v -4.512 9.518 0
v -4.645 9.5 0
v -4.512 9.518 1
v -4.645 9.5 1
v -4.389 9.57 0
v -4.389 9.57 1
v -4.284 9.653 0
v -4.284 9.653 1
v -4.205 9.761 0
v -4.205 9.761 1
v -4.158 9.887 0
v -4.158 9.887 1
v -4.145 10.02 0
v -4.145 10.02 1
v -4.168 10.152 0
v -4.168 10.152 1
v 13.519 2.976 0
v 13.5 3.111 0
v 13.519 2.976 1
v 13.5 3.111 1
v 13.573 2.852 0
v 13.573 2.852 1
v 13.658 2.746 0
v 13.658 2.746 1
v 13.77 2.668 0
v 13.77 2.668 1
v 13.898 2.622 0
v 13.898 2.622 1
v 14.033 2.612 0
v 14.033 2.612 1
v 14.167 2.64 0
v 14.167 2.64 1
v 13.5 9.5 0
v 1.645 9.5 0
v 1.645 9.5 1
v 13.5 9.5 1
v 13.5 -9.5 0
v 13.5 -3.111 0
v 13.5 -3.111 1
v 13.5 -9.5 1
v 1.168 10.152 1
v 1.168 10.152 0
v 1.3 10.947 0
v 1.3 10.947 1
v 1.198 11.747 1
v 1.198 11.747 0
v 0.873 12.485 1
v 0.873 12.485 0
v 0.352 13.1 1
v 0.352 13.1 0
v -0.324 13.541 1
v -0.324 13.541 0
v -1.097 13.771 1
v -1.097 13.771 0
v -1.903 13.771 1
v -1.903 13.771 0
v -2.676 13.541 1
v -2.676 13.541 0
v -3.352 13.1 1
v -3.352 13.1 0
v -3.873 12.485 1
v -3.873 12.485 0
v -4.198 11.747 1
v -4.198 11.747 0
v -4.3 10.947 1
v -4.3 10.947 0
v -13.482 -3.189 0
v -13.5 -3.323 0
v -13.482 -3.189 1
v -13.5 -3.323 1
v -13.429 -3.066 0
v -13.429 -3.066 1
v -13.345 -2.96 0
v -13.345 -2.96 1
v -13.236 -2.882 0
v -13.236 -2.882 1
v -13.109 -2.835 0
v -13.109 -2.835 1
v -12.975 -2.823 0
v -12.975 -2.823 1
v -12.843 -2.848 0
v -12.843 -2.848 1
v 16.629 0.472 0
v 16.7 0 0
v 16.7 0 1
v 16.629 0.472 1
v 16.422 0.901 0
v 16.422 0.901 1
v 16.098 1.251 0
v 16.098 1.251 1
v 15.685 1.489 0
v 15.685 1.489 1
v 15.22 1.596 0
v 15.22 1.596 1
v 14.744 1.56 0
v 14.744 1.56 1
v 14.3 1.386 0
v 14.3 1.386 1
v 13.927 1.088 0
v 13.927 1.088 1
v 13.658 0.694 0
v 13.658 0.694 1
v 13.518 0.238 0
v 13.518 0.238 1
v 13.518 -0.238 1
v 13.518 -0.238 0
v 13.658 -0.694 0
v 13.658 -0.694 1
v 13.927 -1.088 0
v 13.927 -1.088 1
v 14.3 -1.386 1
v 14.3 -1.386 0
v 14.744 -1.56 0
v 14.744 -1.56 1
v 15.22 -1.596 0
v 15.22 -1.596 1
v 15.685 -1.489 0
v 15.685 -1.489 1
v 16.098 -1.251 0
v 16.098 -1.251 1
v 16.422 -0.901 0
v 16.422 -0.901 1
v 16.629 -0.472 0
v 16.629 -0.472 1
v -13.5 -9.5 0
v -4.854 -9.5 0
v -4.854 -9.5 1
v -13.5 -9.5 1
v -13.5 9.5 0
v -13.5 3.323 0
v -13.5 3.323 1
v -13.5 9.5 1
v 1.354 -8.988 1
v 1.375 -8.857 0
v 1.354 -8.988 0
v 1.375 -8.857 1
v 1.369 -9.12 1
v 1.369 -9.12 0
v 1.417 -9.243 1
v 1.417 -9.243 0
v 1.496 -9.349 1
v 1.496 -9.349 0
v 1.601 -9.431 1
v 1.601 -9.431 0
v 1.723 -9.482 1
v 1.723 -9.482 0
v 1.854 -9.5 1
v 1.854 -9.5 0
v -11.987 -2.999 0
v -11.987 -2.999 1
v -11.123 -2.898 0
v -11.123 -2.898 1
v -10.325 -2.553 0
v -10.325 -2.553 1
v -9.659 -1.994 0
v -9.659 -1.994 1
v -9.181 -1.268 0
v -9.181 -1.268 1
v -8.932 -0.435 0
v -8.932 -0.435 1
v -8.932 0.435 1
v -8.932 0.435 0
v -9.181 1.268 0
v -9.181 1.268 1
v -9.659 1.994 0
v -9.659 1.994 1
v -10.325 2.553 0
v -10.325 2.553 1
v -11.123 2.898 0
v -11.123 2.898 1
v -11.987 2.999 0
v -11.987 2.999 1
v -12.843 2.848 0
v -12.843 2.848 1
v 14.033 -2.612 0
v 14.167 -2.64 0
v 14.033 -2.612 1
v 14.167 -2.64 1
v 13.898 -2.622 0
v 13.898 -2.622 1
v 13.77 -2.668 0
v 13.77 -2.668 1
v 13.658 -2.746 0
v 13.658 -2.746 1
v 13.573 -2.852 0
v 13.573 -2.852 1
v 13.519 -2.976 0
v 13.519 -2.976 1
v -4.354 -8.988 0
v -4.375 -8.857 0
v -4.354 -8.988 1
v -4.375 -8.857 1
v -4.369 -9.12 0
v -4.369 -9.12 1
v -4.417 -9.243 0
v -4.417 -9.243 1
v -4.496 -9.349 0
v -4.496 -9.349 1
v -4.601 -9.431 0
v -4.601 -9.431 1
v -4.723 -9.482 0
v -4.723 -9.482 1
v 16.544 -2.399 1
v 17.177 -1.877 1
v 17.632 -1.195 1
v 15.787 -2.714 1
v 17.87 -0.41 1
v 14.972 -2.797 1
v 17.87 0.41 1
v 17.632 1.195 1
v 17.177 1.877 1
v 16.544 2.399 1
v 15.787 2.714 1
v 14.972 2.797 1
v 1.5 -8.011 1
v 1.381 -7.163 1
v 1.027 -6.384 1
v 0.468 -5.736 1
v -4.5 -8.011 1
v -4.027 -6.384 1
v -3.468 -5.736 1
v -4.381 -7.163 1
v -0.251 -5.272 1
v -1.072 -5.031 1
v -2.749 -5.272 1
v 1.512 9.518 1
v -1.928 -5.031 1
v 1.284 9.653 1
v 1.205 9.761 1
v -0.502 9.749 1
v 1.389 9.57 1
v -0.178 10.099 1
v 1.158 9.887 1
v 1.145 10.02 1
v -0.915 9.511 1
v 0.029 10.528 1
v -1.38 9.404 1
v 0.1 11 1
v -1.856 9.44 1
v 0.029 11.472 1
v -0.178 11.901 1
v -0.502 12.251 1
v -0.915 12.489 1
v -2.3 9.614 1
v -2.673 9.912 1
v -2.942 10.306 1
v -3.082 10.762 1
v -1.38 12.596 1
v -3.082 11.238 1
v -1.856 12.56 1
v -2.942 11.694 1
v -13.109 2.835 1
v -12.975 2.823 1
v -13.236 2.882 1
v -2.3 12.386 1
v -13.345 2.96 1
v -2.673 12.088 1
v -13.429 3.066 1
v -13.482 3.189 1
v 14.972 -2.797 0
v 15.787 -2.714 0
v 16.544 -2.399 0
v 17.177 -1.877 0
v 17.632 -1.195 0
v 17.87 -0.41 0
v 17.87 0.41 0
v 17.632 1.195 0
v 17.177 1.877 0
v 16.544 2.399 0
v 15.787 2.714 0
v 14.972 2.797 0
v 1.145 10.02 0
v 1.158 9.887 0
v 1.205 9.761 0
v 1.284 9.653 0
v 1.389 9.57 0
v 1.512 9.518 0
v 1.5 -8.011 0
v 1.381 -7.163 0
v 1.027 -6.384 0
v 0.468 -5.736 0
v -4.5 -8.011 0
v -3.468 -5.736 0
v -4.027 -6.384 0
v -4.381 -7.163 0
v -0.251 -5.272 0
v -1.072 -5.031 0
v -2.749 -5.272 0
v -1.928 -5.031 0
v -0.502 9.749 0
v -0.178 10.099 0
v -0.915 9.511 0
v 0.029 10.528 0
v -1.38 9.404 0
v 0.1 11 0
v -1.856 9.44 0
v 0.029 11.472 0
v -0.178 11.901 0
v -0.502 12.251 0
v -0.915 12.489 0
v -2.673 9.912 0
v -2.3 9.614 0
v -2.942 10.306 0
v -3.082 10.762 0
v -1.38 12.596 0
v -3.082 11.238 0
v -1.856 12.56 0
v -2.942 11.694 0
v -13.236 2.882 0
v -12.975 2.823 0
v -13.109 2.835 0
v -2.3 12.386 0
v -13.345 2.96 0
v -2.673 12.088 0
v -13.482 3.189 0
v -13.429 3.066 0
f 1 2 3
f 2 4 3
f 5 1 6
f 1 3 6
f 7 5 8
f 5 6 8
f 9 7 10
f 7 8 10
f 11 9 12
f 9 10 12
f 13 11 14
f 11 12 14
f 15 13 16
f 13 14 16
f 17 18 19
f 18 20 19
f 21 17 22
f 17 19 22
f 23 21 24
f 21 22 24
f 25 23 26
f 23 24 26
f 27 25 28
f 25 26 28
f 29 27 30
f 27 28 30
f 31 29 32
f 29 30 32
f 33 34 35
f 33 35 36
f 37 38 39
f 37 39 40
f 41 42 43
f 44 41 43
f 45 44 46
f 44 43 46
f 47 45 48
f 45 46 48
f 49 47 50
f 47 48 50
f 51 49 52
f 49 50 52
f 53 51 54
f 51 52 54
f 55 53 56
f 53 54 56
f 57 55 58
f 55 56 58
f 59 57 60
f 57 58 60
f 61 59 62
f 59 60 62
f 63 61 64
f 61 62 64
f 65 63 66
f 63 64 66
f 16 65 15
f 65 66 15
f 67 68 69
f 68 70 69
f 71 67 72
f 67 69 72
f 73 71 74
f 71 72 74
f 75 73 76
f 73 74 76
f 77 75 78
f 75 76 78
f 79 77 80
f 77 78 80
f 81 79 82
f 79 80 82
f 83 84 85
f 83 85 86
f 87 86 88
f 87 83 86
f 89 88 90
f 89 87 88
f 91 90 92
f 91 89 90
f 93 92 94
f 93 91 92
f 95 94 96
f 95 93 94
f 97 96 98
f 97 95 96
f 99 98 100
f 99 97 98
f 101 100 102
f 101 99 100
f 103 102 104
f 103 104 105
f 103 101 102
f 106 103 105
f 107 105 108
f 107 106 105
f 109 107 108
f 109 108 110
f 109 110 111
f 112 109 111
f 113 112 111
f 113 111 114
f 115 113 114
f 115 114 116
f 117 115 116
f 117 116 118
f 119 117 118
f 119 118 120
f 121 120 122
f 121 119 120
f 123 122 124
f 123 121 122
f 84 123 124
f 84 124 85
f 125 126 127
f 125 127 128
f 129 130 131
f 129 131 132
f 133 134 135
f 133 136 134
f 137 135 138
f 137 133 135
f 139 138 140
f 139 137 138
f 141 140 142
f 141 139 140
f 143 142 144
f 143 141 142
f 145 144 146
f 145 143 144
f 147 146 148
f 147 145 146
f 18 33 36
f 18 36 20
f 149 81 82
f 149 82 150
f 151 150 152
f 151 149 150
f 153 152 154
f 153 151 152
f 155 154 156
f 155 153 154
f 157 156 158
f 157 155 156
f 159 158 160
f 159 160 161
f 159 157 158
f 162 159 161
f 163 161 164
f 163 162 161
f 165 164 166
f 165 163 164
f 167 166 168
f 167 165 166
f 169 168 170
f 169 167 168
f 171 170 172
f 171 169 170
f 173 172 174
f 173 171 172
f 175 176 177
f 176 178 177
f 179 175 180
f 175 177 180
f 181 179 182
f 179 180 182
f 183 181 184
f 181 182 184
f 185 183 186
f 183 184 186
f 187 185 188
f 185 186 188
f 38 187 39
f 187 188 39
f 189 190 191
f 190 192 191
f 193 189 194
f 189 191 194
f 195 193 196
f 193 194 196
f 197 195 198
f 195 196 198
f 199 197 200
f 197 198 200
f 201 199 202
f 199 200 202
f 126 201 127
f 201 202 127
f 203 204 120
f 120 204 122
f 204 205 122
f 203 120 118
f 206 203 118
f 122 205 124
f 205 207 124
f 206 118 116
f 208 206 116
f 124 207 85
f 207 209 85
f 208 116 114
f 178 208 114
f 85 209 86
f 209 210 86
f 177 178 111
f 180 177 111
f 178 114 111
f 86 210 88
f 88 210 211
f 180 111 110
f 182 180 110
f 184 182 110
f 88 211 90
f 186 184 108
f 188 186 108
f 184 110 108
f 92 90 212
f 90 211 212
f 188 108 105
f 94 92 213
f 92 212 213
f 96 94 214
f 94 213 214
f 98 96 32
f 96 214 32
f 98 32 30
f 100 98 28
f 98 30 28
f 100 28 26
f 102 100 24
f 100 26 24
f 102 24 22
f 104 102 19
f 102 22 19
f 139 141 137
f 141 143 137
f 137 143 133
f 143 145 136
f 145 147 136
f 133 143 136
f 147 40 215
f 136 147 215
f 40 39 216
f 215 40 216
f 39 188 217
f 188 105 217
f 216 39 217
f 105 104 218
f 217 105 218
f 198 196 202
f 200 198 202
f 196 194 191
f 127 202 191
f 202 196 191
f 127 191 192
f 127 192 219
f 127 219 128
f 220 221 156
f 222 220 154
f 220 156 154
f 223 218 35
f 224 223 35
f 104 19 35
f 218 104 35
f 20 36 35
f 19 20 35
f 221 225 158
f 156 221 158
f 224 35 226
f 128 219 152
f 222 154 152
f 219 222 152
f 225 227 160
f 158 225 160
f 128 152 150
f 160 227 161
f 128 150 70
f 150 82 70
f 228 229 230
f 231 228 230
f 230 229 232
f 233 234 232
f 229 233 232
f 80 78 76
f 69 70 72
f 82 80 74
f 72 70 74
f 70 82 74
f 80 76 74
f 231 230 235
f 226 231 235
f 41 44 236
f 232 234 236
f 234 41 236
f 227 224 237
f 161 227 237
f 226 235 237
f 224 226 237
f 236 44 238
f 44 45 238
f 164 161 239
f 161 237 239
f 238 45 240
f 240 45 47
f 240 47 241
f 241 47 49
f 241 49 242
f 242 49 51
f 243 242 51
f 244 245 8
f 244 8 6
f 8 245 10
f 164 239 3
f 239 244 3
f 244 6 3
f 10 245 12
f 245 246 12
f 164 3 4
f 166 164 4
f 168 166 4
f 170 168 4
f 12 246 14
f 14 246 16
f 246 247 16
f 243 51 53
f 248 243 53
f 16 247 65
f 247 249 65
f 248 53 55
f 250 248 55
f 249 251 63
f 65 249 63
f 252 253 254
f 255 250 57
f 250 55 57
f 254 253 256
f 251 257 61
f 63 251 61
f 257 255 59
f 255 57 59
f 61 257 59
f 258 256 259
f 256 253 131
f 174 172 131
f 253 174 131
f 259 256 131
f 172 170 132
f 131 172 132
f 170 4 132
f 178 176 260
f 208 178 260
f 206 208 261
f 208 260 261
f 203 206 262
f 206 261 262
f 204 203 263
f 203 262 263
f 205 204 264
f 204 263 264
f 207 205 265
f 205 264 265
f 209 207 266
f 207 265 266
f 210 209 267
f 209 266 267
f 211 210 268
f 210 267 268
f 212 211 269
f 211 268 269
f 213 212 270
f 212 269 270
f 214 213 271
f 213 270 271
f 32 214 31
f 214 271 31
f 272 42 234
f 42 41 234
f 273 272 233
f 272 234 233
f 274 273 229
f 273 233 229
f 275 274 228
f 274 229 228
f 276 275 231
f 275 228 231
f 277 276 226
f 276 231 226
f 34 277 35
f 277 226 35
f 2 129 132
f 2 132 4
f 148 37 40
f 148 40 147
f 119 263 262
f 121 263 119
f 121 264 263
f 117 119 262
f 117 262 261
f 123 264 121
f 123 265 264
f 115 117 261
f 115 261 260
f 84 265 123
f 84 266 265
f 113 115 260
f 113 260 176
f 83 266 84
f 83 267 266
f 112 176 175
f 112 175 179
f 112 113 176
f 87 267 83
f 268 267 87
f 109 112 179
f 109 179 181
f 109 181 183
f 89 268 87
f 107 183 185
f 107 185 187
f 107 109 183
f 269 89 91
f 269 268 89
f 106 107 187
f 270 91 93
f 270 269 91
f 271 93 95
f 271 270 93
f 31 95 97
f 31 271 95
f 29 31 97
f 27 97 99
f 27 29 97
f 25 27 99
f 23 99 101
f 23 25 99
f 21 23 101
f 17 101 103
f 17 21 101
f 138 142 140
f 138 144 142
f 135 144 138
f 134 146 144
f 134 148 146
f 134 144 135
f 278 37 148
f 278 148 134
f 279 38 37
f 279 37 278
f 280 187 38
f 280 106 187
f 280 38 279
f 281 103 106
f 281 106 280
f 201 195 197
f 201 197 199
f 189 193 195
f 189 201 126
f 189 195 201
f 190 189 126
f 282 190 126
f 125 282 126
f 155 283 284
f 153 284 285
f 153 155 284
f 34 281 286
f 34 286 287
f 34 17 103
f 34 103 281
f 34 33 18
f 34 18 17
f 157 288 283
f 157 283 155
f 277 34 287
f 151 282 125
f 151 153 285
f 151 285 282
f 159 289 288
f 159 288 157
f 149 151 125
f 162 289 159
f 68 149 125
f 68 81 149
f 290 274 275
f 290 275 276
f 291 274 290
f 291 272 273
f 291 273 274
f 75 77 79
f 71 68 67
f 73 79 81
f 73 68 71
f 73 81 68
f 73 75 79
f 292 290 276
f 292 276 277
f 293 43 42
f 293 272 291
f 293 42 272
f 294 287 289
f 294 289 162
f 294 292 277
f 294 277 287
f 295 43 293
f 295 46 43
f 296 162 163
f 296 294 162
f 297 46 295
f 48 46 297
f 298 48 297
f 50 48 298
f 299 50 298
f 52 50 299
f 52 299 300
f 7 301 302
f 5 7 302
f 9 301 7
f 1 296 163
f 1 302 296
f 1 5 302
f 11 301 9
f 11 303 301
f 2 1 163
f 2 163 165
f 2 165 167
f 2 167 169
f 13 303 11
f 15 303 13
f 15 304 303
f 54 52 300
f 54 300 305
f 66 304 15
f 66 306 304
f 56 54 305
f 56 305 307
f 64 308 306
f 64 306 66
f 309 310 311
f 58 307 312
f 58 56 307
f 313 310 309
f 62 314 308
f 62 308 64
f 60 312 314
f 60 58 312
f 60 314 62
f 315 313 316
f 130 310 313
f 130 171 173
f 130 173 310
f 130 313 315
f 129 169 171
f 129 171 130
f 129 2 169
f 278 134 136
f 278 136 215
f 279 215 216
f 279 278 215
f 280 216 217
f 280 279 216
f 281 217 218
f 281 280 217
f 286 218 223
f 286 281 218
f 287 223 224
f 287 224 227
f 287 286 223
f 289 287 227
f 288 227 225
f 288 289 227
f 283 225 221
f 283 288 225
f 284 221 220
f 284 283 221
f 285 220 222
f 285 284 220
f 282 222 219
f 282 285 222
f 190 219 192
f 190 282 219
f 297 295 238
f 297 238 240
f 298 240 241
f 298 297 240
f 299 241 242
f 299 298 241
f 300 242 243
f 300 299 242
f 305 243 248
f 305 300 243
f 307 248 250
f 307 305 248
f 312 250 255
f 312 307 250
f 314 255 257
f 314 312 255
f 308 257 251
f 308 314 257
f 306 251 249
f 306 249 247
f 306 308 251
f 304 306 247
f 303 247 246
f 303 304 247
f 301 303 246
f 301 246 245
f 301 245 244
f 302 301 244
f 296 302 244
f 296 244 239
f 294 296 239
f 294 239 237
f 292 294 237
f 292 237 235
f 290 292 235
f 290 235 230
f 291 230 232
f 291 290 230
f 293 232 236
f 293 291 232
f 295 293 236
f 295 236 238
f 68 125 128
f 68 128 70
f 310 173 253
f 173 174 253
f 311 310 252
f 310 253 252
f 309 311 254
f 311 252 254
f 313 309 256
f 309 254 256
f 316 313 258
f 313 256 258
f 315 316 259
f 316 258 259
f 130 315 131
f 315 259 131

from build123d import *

# Parameters (mm, degrees)
SKETCH_R    = 1.6
PAD_DEPTH   = 1
FILLET_R    = 0.5
FILLET001_R = 0.5
FILLET002_R = 0.5
FILLET003_R = 0.5
FILLET004_R = 0.5
FILLET005_R = 0.5


with BuildPart() as part:
    # Sketch → Pad (new body)
    with BuildSketch(Plane.XY):
        with BuildLine():
            Line((-13.5, 9.5), (-3.864318, 9.5))
            ThreePointArc((0.864318, 9.5), (-1.5, 13.8), (-3.864318, 9.5))
            Line((0.864318, 9.5), (13.5, 9.5))
            Line((13.5, 9.5), (13.5, 2.297825))
            ThreePointArc((13.5, -2.297825), (17.9, 0), (13.5, 2.297825))
            Line((13.5, -2.297825), (13.5, -9.5))
            Line((13.5, -9.5), (1.098076, -9.5))
            ThreePointArc((1.098076, -9.5), (-1.5, -5), (-4.098076, -9.5))
            Line((-4.098076, -9.5), (-13.5, -9.5))
            Line((-13.5, -9.5), (-13.5, -2.537716))
            ThreePointArc((-13.5, -2.537716), (-8.9, 0), (-13.5, 2.537716))
            Line((-13.5, 2.537716), (-13.5, 9.5))
        make_face()
        with Locations((-1.5, 11)):
            Circle(SKETCH_R, mode=Mode.SUBTRACT)
        with Locations((15.1, 0)):
            Circle(SKETCH_R, mode=Mode.SUBTRACT)
    extrude(amount=PAD_DEPTH)

    # Fillet
    fillet_edges = [part.edges().sort_by_distance(p)[0] for p in [
        (-3.864318, 9.5, 0.5),
    ]]
    fillet(fillet_edges, radius=FILLET_R)

    # Fillet001
    fillet001_edges = [part.edges().sort_by_distance(p)[0] for p in [
        (0.864318, 9.5, 0.5),
    ]]
    fillet(fillet001_edges, radius=FILLET001_R)

    # Fillet002
    fillet002_edges = [part.edges().sort_by_distance(p)[0] for p in [
        (13.5, 2.297825, 0.5),
    ]]
    fillet(fillet002_edges, radius=FILLET002_R)

    # Fillet003
    fillet003_edges = [part.edges().sort_by_distance(p)[0] for p in [
        (13.5, -2.297825, 0.5),
    ]]
    fillet(fillet003_edges, radius=FILLET003_R)

    # Fillet004
    fillet004_edges = [part.edges().sort_by_distance(p)[0] for p in [
        (-4.098076, -9.5, 0.5),
    ]]
    fillet(fillet004_edges, radius=FILLET004_R)

    # Fillet005
    fillet005_edges = [part.edges().sort_by_distance(p)[0] for p in [
        (1.098076, -9.5, 0.5),
        (-13.5, -2.537716, 0.5),
        (-13.5, 2.537716, 0.5),
    ]]
    fillet(fillet005_edges, radius=FILLET005_R)


solid = part.part
